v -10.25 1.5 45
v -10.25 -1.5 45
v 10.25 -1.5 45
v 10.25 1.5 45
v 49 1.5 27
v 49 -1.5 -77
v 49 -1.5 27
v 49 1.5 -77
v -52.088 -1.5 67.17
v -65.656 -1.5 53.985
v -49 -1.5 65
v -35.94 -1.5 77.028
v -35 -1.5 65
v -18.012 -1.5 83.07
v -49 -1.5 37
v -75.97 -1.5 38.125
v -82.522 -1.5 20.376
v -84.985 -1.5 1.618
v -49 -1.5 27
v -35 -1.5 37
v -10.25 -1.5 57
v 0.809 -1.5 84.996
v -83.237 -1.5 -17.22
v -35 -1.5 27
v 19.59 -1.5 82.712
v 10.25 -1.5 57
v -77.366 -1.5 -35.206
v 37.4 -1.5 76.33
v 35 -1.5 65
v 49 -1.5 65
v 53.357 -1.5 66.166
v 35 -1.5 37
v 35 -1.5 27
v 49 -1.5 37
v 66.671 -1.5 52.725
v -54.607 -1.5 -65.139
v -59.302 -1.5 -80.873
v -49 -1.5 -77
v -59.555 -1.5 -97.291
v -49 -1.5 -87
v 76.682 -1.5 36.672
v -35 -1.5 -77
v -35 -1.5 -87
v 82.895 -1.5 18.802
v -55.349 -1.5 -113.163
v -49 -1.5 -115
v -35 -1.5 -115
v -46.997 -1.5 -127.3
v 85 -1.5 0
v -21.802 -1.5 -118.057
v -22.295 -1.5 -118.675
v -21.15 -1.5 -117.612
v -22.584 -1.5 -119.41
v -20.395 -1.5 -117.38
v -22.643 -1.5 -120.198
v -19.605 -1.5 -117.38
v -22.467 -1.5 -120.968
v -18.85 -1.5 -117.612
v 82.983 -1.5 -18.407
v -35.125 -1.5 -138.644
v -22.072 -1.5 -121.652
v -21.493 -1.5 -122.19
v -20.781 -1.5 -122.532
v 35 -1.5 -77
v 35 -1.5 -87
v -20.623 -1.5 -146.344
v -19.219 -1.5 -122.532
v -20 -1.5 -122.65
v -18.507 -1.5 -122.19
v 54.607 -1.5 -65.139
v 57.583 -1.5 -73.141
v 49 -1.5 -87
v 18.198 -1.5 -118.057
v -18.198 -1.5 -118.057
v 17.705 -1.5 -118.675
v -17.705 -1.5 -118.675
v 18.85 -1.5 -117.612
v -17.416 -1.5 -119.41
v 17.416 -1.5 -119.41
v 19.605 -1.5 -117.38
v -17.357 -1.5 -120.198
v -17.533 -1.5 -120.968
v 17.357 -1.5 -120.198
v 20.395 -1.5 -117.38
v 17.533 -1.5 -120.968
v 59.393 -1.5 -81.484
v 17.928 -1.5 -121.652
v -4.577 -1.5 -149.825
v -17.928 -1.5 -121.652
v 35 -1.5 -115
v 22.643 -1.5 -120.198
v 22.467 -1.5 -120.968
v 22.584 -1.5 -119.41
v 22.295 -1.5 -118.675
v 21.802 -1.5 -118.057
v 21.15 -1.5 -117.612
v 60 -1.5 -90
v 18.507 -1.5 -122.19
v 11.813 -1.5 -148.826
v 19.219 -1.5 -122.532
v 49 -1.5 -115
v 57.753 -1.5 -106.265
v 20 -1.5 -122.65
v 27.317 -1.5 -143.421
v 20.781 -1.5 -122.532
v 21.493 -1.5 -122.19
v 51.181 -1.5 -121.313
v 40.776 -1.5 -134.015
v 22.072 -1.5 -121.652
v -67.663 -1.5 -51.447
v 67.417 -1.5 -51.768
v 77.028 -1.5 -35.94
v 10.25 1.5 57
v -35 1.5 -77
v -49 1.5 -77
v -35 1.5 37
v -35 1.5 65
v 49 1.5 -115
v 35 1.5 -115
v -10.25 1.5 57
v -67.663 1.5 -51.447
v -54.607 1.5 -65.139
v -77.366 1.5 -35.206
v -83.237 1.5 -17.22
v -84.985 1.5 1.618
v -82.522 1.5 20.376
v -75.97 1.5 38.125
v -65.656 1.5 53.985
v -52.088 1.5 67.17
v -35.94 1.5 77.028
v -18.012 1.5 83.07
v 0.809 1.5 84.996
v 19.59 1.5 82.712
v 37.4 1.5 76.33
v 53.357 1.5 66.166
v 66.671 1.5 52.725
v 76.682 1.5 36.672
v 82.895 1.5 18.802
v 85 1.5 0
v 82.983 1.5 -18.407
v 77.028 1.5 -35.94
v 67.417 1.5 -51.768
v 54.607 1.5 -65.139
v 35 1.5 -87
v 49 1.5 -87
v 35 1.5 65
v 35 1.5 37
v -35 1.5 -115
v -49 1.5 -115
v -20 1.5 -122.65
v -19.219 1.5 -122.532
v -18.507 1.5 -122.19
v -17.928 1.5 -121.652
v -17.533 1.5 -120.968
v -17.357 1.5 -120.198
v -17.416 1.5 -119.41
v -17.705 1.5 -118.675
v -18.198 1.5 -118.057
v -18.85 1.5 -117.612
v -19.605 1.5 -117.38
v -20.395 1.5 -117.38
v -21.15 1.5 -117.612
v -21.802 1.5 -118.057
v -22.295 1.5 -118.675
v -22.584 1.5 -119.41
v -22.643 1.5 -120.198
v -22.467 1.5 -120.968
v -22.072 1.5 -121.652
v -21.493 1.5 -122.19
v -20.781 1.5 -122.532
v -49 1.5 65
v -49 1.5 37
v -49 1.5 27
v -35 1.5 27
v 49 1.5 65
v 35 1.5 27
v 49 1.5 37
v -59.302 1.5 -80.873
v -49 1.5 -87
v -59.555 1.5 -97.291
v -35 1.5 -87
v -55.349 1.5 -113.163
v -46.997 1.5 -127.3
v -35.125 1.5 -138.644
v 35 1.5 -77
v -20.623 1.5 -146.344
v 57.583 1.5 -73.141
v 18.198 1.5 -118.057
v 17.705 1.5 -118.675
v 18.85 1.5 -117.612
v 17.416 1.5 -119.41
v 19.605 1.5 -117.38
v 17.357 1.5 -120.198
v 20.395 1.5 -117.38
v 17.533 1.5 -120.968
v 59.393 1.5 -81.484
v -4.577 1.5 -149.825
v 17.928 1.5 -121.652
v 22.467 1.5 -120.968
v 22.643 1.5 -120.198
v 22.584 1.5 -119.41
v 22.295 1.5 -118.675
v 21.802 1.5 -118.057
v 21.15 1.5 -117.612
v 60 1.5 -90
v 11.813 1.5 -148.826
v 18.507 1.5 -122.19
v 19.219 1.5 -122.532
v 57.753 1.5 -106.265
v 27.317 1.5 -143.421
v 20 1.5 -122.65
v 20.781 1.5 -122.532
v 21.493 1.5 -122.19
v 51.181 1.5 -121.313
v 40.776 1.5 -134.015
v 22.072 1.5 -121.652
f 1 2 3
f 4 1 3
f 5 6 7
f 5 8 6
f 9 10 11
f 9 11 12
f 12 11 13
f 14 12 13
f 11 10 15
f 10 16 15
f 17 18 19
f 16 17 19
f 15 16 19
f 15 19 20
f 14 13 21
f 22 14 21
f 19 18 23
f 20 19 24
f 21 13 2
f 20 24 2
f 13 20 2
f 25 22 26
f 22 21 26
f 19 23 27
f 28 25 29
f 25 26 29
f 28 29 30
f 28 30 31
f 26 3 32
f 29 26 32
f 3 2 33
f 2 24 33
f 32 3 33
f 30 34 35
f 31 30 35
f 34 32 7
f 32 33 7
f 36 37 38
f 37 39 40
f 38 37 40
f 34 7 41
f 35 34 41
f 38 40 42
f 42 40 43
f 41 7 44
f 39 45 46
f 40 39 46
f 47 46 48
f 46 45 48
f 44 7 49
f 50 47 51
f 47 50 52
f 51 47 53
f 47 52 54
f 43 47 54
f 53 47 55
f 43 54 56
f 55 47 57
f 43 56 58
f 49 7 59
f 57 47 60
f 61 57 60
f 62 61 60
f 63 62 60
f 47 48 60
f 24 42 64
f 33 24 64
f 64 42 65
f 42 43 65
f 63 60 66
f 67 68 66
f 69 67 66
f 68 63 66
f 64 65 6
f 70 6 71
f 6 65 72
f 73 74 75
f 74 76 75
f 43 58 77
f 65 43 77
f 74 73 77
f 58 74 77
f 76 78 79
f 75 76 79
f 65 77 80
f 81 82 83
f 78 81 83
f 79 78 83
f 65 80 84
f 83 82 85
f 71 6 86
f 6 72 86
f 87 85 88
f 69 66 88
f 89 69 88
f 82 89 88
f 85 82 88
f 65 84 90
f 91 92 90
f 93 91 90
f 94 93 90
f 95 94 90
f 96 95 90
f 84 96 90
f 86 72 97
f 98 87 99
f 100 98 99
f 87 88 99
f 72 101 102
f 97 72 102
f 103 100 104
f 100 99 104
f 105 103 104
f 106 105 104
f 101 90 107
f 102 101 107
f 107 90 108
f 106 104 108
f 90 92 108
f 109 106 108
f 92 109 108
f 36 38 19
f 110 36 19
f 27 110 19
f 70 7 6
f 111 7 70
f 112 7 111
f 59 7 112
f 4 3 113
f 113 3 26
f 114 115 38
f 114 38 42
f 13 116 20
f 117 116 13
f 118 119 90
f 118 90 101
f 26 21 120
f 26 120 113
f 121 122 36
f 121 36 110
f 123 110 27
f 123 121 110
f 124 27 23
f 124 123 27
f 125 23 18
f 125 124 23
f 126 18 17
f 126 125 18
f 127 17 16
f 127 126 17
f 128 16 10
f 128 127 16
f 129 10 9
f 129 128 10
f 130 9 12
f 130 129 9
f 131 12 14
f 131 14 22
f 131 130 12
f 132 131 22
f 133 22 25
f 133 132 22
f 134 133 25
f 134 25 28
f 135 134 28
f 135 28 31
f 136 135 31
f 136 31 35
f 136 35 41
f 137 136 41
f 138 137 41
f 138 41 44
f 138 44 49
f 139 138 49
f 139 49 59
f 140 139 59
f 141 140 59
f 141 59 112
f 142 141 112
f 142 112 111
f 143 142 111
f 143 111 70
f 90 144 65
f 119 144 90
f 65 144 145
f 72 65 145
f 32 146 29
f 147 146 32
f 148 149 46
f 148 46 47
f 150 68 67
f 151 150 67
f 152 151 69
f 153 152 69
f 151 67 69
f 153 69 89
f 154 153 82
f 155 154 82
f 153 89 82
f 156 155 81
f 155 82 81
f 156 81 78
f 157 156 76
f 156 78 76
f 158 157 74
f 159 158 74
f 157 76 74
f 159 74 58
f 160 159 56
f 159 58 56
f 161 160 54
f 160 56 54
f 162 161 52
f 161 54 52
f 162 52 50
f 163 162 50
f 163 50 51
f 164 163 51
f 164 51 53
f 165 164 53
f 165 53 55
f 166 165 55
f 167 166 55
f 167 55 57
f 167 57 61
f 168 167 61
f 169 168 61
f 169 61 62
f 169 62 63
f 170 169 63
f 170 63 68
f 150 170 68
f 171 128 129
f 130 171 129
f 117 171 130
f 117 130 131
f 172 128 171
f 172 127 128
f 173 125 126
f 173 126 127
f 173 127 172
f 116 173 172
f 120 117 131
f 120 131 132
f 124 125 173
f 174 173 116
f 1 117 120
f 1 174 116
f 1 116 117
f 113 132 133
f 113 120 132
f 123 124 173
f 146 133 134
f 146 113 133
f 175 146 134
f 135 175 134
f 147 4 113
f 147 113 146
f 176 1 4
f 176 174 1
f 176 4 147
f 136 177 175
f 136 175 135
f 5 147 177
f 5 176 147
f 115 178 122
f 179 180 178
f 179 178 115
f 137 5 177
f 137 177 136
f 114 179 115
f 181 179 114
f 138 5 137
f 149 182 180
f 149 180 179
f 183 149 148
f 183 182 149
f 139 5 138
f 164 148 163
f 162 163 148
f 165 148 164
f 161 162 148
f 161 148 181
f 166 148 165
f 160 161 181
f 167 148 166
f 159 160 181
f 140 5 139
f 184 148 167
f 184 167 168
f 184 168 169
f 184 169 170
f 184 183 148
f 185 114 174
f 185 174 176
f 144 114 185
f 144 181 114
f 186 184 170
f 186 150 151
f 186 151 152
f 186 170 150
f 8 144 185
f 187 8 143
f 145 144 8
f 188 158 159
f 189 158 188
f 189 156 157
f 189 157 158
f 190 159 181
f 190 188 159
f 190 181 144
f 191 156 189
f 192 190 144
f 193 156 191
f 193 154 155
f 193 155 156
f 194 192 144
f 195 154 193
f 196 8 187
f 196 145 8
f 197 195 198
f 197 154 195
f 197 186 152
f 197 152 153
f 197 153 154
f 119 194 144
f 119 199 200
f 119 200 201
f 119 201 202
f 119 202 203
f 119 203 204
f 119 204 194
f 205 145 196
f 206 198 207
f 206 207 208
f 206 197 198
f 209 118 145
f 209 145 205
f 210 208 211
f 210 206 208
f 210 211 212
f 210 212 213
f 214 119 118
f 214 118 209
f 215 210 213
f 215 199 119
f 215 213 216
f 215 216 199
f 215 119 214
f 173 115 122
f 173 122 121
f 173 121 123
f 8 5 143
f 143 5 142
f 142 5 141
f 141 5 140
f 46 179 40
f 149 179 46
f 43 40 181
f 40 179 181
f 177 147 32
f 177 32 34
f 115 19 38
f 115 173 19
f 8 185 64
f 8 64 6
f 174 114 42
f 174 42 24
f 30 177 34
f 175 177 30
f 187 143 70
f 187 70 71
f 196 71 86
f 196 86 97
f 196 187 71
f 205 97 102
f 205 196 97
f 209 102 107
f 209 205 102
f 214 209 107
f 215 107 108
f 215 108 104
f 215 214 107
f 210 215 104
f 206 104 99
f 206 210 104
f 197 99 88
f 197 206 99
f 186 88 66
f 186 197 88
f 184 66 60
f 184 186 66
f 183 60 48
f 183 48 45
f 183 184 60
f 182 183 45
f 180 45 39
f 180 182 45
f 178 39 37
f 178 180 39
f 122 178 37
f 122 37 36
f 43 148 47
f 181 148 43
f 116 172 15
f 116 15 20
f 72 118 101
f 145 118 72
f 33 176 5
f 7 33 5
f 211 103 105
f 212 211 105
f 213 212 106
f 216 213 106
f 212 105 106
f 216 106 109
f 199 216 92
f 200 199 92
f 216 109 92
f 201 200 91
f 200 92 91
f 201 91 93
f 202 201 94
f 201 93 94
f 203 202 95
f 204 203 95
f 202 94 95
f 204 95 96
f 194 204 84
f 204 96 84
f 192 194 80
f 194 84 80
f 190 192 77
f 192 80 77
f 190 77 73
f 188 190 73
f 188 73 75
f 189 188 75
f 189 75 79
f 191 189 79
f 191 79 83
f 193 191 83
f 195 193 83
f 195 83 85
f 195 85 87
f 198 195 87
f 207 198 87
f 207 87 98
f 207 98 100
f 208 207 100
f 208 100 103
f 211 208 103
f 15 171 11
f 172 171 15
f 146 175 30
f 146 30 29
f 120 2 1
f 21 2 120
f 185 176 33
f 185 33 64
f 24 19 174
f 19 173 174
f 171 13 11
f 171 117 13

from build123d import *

# Parameters (mm, degrees)
CROQUIS1_W              = 14
CROQUIS1_H              = 10
SALIENTE_EXTRUIR1_DEPTH = 1.5
CROQUIS2_R              = 2.65
CROQUIS2_W              = 20.5
CROQUIS2_H              = 12
CORTAR_EXTRUIR1_DEPTH   = 10


with BuildPart() as part:
    # Croquis1 → Saliente-Extruir1 (new, symmetric)
    with BuildSketch(Plane(origin=(0, 0, 0), x_dir=(1, 0, 0), z_dir=(0, 1, 0))):
        with BuildLine():
            ThreePointArc((54.607006458, 65.138888889), (52.033105226, 60.124324936), (49, 55.373420614))
            Line((49, 55.373420614), (49, -27))
            Line((49, -27), (49, -37))
            Line((49, -37), (49, -65))
            Line((49, -65), (35, -65))
            Line((35, -65), (35, -37))
            Line((35, -37), (35, -27))
            Line((35, -27), (35, 41.266028276))
            ThreePointArc((35, 41.266028276), (0, 30), (-35, 41.266028276))
            Line((-35, 41.266028276), (-35, -27))
            Line((-35, -27), (-35, -37))
            Line((-35, -37), (-35, -65))
            Line((-35, -65), (-49, -65))
            Line((-49, -65), (-49, -37))
            Line((-49, -37), (-49, -27))
            Line((-49, -27), (-49, 55.373420614))
            ThreePointArc((-49, 55.373420614), (-52.033105226, 60.124324936), (-54.607006458, 65.138888889))
            ThreePointArc((-54.607006458, 65.138888889), (-35.940259119, -77.027902571), (85, 0))
            ThreePointArc((85, 0), (77.027902571, 35.940259119), (54.607006458, 65.138888889))
        make_face()
        with BuildLine():
            Line((35, 77), (35, 77.459666924))
            ThreePointArc((35, 77.459666924), (0, 85), (-35, 77.459666924))
            Line((-35, 77.459666924), (-35, 77))
            Line((-35, 77), (-35, 41.266028276))
            ThreePointArc((-35, 41.266028276), (0, 30), (35, 41.266028276))
            Line((35, 41.266028276), (35, 77))
        make_face()
        with BuildLine():
            Line((-49, 55.373420614), (-49, 69.455021417))
            ThreePointArc((-49, 69.455021417), (-51.848434854, 67.35532498), (-54.607006458, 65.138888889))
            ThreePointArc((-54.607006458, 65.138888889), (-52.033105226, 60.124324936), (-49, 55.373420614))
        make_face()
        with BuildLine():
            Line((35, 115), (49, 115))
            Line((49, 115), (49, 87))
            Line((49, 87), (49, 77))
            Line((49, 77), (49, 69.455021417))
            ThreePointArc((49, 69.455021417), (51.848434854, 67.35532498), (54.607006458, 65.138888889))
            ThreePointArc((54.607006458, 65.138888889), (58.636253238, 77.280337809), (60, 90))
            ThreePointArc((60, 90), (-12.719662191, 148.636253238), (-54.607006458, 65.138888889))
            ThreePointArc((-54.607006458, 65.138888889), (-51.848434854, 67.35532498), (-49, 69.455021417))
            Line((-49, 69.455021417), (-49, 77))
            Line((-49, 77), (-49, 87))
            Line((-49, 87), (-49, 115))
            Line((-49, 115), (-35, 115))
            Line((-35, 115), (-35, 87))
            Line((-35, 87), (-35, 77.459666924))
            ThreePointArc((-35, 77.459666924), (0, 85), (35, 77.459666924))
            Line((35, 77.459666924), (35, 87))
            Line((35, 87), (35, 115))
        make_face()
        with BuildLine():
            ThreePointArc((54.607006458, 65.138888889), (51.848434854, 67.35532498), (49, 69.455021417))
            Line((49, 69.455021417), (49, 55.373420614))
            ThreePointArc((49, 55.373420614), (52.033105226, 60.124324936), (54.607006458, 65.138888889))
        make_face()
        with Locations((-42, -32)):
            Rectangle(CROQUIS1_W, CROQUIS1_H)
        with Locations((42, -32)):
            Rectangle(CROQUIS1_W, CROQUIS1_H)
        with Locations((42, 82)):
            Rectangle(CROQUIS1_W, CROQUIS1_H)
        with Locations((-42, 82)):
            Rectangle(CROQUIS1_W, CROQUIS1_H)
    extrude(amount=SALIENTE_EXTRUIR1_DEPTH, both=True)

    # Croquis2 → Cortar-Extruir1 (cut)
    with BuildSketch(Plane.XZ.offset(1.5)):
        with Locations(Location((-20, -120, 0), (0, 0, 270))):
            Circle(CROQUIS2_R)
        with Locations(Location((20, -120, 0), (0, 0, 270))):
            Circle(CROQUIS2_R)
        with Locations((0, 51)):
            Rectangle(CROQUIS2_W, CROQUIS2_H)
    extrude(amount=-CORTAR_EXTRUIR1_DEPTH, mode=Mode.SUBTRACT)


solid = part.part
